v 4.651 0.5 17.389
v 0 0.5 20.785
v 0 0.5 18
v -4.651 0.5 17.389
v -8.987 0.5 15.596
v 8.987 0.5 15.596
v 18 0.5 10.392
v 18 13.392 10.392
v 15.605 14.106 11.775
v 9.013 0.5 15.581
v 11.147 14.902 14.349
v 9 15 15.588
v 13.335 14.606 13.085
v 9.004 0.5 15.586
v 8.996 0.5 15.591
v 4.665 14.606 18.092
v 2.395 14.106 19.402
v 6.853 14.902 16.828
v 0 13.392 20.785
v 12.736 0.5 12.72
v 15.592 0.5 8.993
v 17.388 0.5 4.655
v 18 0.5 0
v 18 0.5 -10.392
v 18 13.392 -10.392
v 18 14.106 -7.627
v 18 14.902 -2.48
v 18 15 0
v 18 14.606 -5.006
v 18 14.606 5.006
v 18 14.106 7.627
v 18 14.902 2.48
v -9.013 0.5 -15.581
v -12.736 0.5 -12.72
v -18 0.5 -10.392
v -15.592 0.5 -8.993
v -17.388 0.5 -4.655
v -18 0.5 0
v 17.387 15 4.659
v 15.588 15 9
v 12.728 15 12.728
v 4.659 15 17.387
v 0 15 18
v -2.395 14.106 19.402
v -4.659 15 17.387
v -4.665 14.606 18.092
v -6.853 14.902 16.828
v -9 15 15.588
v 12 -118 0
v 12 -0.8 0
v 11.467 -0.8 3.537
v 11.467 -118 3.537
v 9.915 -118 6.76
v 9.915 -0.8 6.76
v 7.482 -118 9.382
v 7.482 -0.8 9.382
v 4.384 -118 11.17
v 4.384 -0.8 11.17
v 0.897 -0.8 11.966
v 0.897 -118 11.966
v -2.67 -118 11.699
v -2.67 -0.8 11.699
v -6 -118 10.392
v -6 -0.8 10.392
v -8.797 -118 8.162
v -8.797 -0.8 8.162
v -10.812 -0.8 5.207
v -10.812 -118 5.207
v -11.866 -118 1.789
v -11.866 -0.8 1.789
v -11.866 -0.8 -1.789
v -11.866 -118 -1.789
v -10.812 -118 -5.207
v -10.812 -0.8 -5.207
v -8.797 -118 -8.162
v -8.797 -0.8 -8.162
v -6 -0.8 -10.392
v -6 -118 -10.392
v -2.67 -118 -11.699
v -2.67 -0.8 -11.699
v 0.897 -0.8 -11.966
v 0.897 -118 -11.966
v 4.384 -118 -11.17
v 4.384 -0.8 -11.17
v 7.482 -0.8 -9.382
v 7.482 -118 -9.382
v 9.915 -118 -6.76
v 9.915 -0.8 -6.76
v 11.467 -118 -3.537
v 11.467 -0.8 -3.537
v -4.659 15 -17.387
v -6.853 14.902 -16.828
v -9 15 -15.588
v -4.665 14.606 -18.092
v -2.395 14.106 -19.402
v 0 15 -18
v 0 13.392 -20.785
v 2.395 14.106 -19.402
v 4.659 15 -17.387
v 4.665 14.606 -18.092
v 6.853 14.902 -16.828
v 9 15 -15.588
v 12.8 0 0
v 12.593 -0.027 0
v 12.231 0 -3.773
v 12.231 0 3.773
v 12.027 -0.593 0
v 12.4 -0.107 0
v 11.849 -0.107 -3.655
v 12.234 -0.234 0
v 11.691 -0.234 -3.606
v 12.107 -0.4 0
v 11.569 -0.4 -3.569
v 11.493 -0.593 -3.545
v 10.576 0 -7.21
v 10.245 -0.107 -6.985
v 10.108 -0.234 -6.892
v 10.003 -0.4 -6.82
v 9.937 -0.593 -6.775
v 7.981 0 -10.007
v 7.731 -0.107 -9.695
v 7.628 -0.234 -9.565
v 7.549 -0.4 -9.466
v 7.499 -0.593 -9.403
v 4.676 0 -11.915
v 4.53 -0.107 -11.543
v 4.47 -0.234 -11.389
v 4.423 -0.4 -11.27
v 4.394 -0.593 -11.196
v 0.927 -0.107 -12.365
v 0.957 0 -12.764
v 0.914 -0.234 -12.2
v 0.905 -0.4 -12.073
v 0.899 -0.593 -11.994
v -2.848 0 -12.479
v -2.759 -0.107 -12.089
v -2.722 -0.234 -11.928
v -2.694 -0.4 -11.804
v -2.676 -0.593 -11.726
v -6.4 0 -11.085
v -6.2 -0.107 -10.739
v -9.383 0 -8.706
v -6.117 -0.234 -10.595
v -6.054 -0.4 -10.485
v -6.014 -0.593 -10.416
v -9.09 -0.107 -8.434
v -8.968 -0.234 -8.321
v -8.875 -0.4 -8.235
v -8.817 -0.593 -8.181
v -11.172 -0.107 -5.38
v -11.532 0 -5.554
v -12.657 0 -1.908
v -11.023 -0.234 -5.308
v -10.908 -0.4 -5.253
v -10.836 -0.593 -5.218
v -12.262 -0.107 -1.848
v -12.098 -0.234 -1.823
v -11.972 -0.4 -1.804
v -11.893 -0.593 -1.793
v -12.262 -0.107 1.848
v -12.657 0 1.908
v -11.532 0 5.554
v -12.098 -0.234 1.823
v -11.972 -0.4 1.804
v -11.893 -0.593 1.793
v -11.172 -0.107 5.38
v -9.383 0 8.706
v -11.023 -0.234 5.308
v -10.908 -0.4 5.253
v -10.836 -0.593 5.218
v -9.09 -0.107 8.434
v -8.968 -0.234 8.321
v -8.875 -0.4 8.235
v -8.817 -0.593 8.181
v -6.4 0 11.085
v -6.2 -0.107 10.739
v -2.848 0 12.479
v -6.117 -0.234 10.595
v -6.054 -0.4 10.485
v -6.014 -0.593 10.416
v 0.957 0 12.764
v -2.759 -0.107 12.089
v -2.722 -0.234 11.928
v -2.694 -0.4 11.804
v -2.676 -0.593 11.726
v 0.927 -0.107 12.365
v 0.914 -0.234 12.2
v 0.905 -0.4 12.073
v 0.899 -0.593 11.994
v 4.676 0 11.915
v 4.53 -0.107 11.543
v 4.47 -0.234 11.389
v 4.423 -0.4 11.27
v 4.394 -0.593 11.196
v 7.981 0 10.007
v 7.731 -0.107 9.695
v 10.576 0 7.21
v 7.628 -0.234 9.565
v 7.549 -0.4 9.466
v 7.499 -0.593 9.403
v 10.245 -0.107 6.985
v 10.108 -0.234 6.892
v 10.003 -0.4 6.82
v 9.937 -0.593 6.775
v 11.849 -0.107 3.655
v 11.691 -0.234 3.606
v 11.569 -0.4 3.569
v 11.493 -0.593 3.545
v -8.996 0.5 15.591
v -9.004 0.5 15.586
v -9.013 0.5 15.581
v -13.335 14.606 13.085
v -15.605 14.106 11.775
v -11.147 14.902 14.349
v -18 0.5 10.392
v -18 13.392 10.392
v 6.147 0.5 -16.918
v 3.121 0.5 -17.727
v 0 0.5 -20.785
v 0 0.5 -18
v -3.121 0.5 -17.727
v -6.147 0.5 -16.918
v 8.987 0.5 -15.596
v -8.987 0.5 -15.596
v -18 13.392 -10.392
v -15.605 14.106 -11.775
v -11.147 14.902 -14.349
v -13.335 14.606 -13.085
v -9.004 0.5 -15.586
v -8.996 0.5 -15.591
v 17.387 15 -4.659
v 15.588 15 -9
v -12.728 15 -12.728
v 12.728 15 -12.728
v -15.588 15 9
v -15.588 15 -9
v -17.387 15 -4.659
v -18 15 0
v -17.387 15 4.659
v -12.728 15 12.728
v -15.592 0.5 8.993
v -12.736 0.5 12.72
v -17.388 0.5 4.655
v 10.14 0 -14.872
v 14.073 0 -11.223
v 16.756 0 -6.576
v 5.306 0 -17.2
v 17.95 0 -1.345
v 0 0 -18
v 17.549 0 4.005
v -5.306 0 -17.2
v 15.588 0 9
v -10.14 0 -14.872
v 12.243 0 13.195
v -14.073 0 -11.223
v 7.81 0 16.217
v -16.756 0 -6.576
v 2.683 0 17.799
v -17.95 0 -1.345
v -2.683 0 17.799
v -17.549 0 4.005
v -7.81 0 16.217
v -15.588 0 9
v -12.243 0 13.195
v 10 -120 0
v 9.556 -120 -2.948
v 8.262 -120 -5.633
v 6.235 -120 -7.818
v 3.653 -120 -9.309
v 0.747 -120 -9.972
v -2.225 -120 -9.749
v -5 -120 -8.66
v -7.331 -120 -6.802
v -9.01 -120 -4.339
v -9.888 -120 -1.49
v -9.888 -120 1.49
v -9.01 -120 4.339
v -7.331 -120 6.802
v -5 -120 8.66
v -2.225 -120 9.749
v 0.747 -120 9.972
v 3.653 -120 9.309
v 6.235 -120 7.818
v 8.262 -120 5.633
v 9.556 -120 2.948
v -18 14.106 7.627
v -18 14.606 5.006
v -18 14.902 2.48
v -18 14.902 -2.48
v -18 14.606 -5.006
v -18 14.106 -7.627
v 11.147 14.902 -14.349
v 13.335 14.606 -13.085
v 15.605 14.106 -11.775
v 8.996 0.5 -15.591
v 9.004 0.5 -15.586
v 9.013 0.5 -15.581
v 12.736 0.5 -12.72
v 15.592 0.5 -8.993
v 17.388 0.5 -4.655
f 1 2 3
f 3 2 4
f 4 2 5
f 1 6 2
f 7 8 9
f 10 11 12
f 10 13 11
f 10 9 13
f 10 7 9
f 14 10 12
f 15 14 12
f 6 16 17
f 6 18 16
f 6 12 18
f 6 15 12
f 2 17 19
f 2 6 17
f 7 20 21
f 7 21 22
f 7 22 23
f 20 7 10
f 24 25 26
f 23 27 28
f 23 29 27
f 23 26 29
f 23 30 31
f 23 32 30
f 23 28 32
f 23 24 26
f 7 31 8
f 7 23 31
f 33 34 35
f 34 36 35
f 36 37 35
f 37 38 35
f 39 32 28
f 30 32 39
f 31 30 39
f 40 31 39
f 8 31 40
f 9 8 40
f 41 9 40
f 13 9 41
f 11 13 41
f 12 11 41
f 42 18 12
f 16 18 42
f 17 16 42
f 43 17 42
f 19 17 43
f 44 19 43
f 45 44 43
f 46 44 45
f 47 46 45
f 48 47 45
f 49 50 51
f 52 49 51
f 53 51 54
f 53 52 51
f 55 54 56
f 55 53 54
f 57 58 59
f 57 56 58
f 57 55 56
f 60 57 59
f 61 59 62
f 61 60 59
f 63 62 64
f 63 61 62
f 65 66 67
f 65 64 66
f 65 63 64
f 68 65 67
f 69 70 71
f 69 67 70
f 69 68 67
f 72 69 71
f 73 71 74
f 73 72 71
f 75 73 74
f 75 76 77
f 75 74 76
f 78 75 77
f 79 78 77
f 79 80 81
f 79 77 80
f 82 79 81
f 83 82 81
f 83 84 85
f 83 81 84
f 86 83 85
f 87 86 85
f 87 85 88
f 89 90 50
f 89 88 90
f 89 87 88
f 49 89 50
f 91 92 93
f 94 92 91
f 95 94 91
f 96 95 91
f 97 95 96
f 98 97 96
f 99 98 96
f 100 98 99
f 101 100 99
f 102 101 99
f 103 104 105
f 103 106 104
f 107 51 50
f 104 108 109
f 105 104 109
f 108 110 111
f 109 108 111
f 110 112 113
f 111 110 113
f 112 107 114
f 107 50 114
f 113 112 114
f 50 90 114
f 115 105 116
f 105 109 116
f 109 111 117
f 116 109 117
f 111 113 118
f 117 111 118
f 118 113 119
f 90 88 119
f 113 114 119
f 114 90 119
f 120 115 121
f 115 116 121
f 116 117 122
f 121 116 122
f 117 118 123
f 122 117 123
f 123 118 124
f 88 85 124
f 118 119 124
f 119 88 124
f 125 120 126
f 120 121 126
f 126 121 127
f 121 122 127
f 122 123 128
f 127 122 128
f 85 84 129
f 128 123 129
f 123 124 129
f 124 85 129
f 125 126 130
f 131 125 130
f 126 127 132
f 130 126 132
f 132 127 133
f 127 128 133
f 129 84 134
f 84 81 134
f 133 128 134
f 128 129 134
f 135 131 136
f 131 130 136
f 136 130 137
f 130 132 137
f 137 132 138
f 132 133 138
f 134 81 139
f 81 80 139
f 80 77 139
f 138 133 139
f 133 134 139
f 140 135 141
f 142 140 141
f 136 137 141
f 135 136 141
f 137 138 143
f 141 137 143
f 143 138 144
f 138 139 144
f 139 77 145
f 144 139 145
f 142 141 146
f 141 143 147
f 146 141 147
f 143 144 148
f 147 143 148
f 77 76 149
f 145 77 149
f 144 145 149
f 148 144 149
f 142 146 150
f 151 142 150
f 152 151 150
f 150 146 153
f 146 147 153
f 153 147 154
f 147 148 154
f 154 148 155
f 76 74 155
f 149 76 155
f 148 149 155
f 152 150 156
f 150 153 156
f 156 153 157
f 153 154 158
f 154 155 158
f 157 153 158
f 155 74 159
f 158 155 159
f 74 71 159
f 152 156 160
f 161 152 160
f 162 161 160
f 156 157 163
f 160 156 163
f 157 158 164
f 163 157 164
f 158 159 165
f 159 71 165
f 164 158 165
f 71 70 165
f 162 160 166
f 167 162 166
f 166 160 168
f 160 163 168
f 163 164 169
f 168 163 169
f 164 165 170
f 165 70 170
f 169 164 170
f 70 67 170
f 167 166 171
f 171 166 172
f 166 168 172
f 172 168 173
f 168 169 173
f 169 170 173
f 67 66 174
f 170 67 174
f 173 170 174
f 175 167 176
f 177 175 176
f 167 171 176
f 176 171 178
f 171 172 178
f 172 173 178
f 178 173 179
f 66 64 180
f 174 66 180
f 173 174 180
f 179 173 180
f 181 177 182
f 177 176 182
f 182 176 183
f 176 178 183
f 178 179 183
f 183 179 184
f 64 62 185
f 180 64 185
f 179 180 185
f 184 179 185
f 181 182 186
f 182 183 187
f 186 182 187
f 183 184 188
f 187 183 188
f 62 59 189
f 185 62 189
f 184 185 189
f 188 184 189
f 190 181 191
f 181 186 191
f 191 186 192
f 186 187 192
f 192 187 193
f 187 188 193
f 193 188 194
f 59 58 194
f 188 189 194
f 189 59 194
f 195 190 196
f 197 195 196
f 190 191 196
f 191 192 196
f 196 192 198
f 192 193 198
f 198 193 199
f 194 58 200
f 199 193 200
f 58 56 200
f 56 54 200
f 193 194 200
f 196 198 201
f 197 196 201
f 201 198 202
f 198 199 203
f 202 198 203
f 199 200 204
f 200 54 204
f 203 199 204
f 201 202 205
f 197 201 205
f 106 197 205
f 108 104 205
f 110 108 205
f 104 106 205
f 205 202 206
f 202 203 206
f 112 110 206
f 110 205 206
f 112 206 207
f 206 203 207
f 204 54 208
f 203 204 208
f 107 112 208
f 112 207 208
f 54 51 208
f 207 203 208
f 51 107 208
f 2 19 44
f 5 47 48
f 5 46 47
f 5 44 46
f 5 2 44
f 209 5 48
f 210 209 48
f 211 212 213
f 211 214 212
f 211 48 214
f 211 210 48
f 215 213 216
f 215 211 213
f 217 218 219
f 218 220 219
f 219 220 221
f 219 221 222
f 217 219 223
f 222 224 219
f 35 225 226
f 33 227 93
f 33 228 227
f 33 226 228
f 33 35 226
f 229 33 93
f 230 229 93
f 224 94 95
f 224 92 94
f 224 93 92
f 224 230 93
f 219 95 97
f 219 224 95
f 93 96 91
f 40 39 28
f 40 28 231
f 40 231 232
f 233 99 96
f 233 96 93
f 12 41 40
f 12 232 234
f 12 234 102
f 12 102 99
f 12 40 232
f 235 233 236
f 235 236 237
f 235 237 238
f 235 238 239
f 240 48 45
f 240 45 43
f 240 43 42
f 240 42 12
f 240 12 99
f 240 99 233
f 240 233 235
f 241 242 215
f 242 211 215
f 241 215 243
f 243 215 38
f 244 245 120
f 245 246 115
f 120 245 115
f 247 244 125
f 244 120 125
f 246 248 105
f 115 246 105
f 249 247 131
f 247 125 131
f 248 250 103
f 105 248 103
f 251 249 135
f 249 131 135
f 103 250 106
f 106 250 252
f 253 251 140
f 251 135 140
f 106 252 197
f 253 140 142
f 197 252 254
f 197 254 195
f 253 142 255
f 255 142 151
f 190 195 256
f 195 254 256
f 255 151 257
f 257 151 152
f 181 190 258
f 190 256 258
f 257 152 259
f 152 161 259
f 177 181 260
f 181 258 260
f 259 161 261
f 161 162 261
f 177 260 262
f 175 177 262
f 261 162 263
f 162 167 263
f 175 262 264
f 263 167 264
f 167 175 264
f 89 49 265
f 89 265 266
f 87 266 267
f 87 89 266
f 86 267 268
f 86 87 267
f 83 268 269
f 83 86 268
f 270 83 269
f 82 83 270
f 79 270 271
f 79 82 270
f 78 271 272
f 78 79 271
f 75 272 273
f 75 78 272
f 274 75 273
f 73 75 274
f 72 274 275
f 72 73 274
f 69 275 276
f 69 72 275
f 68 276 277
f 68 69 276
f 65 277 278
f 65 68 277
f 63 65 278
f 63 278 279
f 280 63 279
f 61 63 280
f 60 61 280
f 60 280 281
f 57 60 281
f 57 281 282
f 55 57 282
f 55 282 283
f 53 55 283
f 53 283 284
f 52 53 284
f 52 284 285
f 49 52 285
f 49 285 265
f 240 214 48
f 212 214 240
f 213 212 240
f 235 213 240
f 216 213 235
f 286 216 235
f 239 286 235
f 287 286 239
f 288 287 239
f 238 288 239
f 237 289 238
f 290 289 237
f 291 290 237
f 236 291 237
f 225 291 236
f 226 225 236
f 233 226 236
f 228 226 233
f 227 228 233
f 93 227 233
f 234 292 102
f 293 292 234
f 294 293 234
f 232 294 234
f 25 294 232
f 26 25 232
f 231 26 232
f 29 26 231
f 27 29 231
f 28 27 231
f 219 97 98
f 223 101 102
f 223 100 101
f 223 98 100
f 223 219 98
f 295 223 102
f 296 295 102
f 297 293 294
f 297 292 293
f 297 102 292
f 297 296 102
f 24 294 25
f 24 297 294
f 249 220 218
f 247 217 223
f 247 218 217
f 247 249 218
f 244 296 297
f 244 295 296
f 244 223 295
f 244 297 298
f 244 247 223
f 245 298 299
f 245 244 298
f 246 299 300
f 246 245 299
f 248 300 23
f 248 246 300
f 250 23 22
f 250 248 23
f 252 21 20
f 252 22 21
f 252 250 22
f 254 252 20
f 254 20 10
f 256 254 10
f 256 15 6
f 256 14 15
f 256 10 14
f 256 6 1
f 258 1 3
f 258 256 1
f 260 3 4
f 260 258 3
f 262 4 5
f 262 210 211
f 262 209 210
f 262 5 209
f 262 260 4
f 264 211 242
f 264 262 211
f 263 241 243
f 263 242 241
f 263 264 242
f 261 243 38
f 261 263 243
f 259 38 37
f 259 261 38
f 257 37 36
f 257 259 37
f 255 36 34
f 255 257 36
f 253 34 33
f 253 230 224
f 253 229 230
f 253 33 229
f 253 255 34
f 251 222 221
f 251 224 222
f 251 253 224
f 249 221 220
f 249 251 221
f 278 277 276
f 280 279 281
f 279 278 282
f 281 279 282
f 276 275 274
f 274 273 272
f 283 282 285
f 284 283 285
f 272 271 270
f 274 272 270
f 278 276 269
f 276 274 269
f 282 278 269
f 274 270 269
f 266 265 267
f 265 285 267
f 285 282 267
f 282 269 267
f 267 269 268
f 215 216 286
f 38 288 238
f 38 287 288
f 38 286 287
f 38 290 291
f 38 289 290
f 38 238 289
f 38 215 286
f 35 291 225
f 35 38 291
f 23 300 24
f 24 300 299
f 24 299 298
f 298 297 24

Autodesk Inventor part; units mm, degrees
ref_plane "YZ Plane" through (0, 0, 0) normal (1, 0, 0) x (0, 1, 0)
ref_plane "XZ Plane" through (0, 0, 0) normal (0, 1, 0) x (-1, 0, 0)
ref_plane "XY Plane" through (0, 0, 0) normal (0, 0, 1) x (1, 0, 0)
sketch "Sketch1" plane through (0, 0, 0) normal (0, 1, 0) x (-1, 0, 0)
  line L0 (127.8939, 73.8396) -> (127.8939, -73.8396)
  line L1 (127.8939, -73.8396) -> (0, -147.6791)
  line L2 (0, -147.6791) -> (-127.8939, -73.8396)
  line L3 (-127.8939, -73.8396) -> (-127.8939, 73.8396)
  line L4 (-127.8939, 73.8396) -> (0, 147.6791)
  line L5 (0, 147.6791) -> (127.8939, 73.8396)
  line L6 (-18, 10.3923) -> (0, 20.7846)
  line L7 (0, 20.7846) -> (18, 10.3923)
  line L8 (18, 10.3923) -> (18, -10.3923)
  line L9 (18, -10.3923) -> (0, -20.7846)
  line L10 (0, -20.7846) -> (-18, -10.3923)
  line L11 (-18, -10.3923) -> (-18, 10.3923)
  point P0 (0, 0)
  point P1 (0, 0)
  point P2 (0, 0)
  dimension "Shex" = 36
extrude "Extrusion1" add sketch "Sketch1" along normal blind 15 contours L6 L7 L8 L9 L10 L11
sketch "Sketch2" plane through (0, 0, 0) normal (1, 0, 0) x (0, 1, 0)
  line L0 (0, -20.7846) -> (15, -20.7846) construction
  line L1 (15, -20.7846) -> (13.3923, -20.7846)
  line L2 (13.3923, -20.7846) -> (15, -18)
  line L3 (15, -18) -> (15, -20.7846)
  line L4 (-3, 0) -> (18, 0) projected
  point P0 (0, 0)
  dimension "d4" = 60
  dimension "d5" = 36
revolve "Revolution1" cut sketch "Sketch2" angle 360 about axis through (0, -10, 0) along (0, 1, 0)
sketch "Sketch3" plane through (0, 0, 0) normal (0, 0, 1) x (1, 0, 0)
  line L0 (0, 0) -> (12, 0)
  line L1 (12, 0) -> (12, -120)
  line L2 (12, -120) -> (0, -120)
  line L3 (0, -120) -> (0, 0)
  dimension "L" = 120
  dimension "Dia" = 24
revolve "Revolution2" add sketch "Sketch3" angle 360 about axis through (0, -120, 0) along (0, 1, 0)
fillet "Fillet1" radius 0.8 1 edges at (-12, 0, 0)
chamfer "Chamfer1" distance 2 angle 45 1 edges at (-12, -120, 0)
thread "Thread2" size "M24x3" class "6g" standard "ANSI Metric M Profile" length 54
sketch "Sketch6" plane through (0, 0, 0) normal (1, 0, 0) x (0, 1, 0)
  line L0 (-147, 0) -> (42, 0) projected
  line L1 (0, -20.7846) -> (13.3923, -20.7846) projected
  line L2 (0, -20.7846) -> (0, -10.3923) projected
  line L3 (0, -10.3923) -> (13.3923, -10.3923) projected
  line L4 (0, -20.7846) -> (0.5, -20.7846)
  line L5 (0.5, -20.7846) -> (0.5, -18)
  line L6 (0.5, -18) -> (0, -18)
  line L7 (0, -18) -> (0, -20.7846)
  point P0 (0, 0)
  point P1 (15, -15.5885)
  point P2 (0, -18)
  dimension "a" = 0.5
  dimension "d34" = 36
revolve "Revolution3" cut sketch "Sketch6" angle 360 about axis through (0, -10, 0) along (0, 1, 0)
equation "\"d5\" = Shex"
equation "\"d31\" = b - cham"
equation "\"d34\" = Shex"
equation "\"b\" = 56"
equation "\"cham\" = 2"
properties part number "Part16 Real Bolt Thread" material "Steel"
